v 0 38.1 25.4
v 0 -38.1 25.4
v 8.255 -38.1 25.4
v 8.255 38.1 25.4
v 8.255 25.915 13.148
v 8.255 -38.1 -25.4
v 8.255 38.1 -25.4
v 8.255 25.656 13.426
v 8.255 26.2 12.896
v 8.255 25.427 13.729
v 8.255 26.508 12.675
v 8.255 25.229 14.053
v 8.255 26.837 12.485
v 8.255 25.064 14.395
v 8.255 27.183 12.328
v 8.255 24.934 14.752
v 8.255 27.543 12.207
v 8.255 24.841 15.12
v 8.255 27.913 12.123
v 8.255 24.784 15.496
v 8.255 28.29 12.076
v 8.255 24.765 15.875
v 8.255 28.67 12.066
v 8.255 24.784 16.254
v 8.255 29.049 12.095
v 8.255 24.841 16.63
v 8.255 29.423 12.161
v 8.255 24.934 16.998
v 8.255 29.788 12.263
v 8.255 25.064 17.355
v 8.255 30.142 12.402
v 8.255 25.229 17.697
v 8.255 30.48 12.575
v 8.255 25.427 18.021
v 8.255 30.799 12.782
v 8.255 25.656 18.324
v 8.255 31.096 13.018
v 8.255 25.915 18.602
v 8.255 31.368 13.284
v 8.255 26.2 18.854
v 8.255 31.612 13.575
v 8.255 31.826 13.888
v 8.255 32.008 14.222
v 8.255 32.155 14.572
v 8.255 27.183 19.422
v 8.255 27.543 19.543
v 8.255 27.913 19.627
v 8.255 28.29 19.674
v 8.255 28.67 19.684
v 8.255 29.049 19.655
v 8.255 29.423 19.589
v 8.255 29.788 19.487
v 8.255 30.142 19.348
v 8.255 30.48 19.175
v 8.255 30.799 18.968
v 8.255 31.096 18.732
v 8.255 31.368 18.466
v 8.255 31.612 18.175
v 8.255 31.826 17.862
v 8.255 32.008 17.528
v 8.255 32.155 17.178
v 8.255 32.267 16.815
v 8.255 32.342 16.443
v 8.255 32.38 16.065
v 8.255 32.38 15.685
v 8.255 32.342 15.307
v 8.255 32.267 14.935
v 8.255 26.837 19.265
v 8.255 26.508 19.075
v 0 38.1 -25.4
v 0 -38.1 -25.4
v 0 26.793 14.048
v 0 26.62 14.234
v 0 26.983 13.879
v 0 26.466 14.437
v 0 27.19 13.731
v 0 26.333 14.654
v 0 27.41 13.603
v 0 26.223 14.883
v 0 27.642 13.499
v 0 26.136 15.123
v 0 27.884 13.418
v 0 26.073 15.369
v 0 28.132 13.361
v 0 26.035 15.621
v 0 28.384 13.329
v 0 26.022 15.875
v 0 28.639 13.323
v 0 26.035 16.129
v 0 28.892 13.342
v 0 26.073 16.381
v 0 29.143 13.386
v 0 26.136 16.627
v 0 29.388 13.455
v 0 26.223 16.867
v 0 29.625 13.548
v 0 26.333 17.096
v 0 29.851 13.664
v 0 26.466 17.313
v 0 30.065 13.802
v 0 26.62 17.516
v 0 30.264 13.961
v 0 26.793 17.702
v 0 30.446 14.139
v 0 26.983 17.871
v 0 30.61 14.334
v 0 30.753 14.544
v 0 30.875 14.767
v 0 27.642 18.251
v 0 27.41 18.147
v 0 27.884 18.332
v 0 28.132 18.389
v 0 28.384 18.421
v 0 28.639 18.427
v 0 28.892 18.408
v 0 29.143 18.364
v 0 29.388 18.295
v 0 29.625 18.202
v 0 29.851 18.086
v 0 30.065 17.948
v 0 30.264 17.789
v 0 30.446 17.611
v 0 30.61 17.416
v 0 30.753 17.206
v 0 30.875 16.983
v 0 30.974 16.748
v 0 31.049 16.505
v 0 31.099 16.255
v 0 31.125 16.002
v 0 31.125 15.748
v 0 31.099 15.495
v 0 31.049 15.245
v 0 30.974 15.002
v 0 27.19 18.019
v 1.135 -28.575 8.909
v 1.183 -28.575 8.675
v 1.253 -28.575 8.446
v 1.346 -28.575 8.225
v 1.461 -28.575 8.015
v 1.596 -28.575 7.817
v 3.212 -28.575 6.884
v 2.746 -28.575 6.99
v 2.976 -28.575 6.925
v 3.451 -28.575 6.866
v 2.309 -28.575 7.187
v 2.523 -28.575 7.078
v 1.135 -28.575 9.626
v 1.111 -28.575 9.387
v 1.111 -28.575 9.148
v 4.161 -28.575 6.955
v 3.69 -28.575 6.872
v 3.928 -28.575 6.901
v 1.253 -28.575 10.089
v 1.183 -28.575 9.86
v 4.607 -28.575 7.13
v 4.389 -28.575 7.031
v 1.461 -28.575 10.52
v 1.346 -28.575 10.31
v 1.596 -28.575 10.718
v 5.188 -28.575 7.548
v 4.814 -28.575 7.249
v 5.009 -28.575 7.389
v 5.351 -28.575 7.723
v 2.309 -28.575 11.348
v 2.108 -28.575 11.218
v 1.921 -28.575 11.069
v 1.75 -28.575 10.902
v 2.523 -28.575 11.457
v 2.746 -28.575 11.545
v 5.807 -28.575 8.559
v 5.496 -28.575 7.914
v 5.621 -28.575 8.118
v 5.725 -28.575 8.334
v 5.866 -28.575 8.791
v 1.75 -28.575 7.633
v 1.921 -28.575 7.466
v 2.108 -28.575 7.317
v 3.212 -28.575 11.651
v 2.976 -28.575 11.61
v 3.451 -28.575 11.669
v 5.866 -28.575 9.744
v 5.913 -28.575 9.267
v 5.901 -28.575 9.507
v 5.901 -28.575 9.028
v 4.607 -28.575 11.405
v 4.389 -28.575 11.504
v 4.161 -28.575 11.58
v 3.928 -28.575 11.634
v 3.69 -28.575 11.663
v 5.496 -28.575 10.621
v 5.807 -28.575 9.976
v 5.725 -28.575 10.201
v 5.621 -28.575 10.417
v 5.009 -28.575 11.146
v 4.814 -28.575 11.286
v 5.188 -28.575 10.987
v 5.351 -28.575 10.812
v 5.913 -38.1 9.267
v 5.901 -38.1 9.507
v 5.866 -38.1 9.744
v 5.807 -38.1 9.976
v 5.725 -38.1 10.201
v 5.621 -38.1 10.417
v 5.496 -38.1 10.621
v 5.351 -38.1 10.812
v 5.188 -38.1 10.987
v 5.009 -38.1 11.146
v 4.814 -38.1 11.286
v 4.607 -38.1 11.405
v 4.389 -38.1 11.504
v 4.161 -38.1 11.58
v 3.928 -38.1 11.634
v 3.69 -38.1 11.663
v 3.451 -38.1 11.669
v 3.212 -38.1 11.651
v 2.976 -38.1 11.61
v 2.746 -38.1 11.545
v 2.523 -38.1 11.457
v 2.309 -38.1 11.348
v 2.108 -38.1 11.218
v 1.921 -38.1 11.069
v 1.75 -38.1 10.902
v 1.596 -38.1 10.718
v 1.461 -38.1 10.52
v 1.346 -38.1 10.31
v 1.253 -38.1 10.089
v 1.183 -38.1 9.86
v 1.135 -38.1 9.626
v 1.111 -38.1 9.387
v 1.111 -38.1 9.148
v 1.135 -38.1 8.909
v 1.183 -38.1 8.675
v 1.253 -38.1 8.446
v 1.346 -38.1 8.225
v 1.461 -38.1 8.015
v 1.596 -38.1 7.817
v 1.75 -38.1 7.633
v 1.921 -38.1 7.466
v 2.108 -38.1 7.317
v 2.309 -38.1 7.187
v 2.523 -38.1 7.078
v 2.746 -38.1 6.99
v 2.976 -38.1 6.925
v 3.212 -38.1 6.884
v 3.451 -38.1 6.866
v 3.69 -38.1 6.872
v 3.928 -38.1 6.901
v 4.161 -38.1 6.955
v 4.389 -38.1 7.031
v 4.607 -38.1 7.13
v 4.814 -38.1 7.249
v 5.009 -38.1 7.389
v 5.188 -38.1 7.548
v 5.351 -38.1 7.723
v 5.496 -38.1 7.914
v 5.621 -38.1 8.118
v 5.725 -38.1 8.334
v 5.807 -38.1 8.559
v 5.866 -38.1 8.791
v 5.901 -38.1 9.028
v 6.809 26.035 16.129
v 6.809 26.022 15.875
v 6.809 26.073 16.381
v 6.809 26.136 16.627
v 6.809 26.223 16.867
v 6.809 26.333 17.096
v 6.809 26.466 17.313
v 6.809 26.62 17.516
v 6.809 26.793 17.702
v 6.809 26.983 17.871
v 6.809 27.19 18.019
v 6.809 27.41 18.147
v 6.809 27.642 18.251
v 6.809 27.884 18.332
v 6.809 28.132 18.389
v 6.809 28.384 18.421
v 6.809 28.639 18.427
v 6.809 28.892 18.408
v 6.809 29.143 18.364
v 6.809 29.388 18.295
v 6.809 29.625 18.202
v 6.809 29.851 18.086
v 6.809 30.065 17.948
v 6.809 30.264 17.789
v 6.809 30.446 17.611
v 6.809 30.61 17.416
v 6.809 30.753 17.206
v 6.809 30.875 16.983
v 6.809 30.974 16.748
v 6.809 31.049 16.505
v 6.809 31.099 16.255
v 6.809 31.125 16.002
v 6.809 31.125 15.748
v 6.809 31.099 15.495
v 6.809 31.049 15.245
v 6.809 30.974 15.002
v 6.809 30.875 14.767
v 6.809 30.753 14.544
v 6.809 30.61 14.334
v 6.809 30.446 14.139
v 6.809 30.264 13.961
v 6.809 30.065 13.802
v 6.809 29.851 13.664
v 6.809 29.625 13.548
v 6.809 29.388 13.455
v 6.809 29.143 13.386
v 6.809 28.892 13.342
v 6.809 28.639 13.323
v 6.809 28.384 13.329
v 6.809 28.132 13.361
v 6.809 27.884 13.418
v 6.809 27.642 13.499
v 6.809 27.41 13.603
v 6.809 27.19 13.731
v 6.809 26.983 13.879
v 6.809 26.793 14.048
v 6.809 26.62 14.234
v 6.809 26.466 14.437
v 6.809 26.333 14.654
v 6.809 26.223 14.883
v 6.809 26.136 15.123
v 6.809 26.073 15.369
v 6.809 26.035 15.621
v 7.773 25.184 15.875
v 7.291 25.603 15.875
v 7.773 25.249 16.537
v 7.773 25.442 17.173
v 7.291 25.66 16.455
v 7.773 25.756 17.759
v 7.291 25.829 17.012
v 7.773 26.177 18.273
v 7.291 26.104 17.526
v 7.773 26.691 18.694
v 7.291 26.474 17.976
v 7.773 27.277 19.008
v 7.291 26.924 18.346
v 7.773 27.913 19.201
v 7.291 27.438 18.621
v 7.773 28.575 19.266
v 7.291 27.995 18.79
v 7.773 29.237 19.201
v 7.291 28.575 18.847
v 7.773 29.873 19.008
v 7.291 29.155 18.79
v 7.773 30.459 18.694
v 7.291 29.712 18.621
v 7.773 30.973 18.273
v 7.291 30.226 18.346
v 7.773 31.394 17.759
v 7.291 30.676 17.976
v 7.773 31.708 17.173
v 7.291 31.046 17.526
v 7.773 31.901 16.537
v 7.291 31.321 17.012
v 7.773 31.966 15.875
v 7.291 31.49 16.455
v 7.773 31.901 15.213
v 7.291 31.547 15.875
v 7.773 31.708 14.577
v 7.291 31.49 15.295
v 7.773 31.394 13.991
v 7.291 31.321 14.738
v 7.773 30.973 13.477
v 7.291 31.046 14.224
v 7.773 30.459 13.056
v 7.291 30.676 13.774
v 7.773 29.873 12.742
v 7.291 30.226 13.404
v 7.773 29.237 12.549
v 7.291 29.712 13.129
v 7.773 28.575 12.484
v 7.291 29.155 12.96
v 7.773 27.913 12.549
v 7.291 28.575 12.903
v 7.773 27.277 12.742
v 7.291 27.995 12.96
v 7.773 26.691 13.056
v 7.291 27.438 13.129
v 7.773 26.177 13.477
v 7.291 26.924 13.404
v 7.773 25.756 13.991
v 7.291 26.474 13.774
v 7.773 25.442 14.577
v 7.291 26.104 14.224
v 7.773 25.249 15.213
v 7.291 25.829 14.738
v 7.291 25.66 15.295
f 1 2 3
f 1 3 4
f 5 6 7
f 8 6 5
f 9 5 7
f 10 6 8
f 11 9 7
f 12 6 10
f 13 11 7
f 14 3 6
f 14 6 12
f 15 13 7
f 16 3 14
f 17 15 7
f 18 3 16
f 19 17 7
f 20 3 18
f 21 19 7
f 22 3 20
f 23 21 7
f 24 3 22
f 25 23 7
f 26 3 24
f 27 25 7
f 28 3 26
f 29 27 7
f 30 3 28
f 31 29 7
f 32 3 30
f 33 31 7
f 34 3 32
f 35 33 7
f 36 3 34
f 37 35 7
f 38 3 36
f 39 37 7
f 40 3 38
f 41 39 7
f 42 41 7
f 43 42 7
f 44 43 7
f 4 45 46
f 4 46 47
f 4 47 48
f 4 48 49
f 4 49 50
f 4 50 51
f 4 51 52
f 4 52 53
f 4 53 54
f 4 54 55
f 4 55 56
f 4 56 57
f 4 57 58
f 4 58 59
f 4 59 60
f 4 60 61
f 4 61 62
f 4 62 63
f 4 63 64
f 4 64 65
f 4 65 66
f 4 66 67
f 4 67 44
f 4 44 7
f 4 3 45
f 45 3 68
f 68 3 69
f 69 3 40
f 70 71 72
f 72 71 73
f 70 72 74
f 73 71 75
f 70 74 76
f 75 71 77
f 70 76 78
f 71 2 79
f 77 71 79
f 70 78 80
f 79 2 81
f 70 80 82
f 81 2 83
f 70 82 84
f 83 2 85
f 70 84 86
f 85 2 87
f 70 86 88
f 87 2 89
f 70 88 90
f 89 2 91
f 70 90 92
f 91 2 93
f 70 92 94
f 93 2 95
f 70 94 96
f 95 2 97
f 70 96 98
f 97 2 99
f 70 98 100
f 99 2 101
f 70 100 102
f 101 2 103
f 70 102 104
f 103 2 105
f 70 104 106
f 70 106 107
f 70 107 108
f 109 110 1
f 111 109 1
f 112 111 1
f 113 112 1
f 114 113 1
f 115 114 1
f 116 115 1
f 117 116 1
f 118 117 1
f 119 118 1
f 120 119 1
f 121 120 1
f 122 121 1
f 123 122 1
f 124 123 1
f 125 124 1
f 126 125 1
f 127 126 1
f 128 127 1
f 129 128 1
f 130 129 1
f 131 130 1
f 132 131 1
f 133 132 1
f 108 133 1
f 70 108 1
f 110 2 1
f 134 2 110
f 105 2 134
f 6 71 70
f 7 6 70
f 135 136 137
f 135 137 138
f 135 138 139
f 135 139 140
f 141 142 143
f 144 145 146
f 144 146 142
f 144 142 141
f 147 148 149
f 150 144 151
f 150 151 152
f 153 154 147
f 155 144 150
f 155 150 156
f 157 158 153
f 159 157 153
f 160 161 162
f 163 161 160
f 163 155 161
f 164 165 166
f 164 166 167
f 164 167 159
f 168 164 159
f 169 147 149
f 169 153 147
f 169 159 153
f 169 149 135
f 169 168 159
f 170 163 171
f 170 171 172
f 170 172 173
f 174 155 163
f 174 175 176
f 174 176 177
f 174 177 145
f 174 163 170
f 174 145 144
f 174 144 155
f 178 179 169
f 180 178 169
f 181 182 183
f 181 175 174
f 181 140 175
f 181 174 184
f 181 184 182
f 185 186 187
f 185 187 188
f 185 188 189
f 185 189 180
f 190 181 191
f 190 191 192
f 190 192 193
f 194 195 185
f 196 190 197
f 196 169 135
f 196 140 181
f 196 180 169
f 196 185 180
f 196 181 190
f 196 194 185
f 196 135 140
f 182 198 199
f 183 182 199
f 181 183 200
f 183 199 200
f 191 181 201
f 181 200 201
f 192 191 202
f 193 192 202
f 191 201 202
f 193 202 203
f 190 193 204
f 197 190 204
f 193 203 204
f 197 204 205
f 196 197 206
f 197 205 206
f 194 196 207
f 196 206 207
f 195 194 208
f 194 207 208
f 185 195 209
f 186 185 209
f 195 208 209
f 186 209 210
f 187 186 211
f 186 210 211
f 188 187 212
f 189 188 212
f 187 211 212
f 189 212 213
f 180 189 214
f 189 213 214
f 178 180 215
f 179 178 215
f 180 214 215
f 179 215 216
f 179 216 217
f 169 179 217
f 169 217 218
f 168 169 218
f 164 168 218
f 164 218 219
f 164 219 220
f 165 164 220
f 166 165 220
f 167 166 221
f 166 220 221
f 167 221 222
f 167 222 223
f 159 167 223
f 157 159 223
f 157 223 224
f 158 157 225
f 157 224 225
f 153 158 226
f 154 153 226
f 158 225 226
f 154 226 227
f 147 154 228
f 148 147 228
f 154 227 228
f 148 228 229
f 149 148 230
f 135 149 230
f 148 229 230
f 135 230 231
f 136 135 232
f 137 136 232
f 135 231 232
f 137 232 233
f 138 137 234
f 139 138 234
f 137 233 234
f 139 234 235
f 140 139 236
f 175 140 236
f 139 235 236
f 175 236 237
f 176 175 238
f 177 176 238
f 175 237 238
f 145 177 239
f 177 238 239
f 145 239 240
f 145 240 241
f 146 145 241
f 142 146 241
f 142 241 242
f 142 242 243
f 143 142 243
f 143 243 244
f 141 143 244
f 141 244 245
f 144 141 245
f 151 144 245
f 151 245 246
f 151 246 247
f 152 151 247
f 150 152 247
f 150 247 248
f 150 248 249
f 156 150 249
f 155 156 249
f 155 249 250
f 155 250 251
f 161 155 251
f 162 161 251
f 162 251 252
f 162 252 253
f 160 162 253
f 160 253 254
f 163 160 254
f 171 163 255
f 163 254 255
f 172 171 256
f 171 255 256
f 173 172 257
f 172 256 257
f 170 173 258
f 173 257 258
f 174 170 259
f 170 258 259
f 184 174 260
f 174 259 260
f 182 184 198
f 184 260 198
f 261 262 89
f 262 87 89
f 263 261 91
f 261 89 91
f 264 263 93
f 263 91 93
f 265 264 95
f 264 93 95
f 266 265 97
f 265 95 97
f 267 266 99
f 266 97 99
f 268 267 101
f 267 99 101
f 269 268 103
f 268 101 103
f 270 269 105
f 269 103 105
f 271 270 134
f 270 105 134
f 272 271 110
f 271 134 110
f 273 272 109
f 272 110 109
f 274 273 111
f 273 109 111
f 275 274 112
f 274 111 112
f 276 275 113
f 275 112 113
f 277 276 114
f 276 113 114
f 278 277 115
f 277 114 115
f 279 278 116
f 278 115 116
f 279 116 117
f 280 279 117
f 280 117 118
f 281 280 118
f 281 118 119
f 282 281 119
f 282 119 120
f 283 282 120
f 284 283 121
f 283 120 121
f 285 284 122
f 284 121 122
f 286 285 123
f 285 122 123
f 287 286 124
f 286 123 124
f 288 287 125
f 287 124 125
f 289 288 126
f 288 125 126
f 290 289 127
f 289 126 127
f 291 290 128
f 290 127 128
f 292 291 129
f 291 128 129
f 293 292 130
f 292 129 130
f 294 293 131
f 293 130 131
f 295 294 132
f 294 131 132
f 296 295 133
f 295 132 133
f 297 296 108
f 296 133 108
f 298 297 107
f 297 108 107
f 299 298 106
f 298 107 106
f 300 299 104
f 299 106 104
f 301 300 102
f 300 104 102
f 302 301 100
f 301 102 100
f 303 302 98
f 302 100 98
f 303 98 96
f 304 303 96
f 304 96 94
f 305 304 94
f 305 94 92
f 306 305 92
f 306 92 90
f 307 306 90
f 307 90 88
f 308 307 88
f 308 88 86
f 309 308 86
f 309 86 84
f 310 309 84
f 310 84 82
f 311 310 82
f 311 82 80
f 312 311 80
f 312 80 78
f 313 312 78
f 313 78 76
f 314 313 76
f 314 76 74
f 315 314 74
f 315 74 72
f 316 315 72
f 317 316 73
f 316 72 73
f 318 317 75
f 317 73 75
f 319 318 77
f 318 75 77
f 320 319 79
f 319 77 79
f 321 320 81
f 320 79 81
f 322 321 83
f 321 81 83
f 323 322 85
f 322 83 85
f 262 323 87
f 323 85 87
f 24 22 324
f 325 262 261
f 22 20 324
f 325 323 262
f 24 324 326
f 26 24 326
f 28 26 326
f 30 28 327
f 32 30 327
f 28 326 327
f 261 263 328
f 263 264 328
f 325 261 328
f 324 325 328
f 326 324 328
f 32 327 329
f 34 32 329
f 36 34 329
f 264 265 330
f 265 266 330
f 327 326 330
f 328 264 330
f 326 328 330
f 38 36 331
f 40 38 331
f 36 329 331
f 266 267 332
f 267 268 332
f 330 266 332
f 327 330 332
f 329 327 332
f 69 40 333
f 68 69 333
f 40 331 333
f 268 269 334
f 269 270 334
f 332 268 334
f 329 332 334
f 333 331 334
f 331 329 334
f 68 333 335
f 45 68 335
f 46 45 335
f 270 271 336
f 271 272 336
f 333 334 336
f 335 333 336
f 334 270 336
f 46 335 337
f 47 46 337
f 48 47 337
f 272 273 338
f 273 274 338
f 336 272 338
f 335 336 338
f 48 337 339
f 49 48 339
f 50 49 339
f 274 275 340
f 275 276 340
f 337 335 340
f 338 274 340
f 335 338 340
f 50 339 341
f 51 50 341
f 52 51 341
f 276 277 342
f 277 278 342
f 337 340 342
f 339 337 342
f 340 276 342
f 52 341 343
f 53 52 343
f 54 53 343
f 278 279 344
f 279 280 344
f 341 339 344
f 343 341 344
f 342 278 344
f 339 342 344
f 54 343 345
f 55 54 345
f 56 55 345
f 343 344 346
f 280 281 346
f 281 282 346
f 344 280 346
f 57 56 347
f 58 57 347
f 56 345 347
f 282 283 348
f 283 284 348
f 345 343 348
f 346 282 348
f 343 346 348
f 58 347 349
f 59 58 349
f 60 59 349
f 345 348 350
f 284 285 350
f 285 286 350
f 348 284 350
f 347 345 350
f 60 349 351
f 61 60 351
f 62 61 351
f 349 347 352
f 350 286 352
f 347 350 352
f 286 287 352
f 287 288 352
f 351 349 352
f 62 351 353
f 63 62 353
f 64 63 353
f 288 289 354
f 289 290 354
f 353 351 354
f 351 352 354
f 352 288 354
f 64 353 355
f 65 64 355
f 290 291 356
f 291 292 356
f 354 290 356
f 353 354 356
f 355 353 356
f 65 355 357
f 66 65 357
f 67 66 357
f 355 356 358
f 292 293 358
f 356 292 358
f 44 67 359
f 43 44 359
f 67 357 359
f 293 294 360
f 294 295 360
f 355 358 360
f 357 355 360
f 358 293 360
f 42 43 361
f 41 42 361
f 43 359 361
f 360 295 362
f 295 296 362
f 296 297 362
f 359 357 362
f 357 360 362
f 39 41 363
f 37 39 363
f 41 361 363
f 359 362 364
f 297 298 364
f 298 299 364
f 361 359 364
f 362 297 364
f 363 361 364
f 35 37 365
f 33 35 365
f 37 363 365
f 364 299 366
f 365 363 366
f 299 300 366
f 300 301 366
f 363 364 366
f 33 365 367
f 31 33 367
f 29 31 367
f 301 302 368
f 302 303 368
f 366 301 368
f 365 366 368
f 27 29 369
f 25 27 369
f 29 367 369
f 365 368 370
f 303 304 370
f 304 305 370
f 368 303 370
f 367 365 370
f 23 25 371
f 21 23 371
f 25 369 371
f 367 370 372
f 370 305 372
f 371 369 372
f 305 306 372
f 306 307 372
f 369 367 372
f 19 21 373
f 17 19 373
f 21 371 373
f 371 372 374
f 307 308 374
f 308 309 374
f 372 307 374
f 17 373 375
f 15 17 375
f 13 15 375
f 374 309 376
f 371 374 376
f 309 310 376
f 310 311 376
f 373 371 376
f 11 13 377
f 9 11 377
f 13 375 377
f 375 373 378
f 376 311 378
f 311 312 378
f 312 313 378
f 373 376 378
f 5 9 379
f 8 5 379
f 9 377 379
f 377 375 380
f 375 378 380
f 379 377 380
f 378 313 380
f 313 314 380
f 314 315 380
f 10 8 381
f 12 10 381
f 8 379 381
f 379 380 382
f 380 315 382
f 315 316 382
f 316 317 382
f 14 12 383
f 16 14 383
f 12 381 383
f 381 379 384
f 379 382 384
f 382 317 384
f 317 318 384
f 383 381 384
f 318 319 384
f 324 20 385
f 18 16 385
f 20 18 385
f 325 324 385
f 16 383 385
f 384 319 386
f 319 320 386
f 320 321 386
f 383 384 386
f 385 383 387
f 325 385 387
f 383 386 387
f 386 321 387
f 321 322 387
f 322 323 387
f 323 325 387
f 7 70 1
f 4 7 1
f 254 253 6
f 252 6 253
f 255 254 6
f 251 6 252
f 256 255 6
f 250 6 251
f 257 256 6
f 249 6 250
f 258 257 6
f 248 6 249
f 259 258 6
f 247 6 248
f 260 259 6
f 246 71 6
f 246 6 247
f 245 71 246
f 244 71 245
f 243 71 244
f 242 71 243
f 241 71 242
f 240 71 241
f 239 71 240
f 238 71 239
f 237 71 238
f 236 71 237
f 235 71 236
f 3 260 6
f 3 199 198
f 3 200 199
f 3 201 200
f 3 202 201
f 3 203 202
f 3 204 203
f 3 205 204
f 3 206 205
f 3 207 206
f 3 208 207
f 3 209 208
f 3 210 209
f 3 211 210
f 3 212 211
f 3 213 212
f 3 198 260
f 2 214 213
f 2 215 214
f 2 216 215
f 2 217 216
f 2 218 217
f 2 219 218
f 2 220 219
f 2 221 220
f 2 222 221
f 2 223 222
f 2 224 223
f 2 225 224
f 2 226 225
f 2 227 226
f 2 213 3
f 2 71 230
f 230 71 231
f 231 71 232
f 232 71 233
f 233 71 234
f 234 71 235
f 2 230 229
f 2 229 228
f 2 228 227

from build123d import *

# Parameters (mm, degrees)
F0_W           = 76.2
F0_H           = 50.8
F1_DEPTH       = 8.255
F2_R           = 2.402553
F3_DEPTH       = 9.525
F5_D           = 5.1054
F5_CSINK_D     = 7.62
F5_CSINK_ANGLE = 82


with BuildPart() as f1:
    # F0 (on Right) → F1 (new body)
    with BuildSketch(Plane.YZ):
        Rectangle(F0_W, F0_H)
    extrude(amount=F1_DEPTH)

    # F2 (on face) → F3 (cut)
    with BuildSketch(Plane.XZ.offset(38.1)):
        with Locations((3.510773, 9.267487)):
            Circle(F2_R)
    extrude(amount=-F3_DEPTH, mode=Mode.SUBTRACT)

    # F5 (through all)
    with Locations(Plane.YZ.offset(8.255)):
        with Locations((28.575, 15.875)):
            CounterSinkHole(F5_D / 2, F5_CSINK_D / 2, counter_sink_angle=F5_CSINK_ANGLE)


solid = f1.part
